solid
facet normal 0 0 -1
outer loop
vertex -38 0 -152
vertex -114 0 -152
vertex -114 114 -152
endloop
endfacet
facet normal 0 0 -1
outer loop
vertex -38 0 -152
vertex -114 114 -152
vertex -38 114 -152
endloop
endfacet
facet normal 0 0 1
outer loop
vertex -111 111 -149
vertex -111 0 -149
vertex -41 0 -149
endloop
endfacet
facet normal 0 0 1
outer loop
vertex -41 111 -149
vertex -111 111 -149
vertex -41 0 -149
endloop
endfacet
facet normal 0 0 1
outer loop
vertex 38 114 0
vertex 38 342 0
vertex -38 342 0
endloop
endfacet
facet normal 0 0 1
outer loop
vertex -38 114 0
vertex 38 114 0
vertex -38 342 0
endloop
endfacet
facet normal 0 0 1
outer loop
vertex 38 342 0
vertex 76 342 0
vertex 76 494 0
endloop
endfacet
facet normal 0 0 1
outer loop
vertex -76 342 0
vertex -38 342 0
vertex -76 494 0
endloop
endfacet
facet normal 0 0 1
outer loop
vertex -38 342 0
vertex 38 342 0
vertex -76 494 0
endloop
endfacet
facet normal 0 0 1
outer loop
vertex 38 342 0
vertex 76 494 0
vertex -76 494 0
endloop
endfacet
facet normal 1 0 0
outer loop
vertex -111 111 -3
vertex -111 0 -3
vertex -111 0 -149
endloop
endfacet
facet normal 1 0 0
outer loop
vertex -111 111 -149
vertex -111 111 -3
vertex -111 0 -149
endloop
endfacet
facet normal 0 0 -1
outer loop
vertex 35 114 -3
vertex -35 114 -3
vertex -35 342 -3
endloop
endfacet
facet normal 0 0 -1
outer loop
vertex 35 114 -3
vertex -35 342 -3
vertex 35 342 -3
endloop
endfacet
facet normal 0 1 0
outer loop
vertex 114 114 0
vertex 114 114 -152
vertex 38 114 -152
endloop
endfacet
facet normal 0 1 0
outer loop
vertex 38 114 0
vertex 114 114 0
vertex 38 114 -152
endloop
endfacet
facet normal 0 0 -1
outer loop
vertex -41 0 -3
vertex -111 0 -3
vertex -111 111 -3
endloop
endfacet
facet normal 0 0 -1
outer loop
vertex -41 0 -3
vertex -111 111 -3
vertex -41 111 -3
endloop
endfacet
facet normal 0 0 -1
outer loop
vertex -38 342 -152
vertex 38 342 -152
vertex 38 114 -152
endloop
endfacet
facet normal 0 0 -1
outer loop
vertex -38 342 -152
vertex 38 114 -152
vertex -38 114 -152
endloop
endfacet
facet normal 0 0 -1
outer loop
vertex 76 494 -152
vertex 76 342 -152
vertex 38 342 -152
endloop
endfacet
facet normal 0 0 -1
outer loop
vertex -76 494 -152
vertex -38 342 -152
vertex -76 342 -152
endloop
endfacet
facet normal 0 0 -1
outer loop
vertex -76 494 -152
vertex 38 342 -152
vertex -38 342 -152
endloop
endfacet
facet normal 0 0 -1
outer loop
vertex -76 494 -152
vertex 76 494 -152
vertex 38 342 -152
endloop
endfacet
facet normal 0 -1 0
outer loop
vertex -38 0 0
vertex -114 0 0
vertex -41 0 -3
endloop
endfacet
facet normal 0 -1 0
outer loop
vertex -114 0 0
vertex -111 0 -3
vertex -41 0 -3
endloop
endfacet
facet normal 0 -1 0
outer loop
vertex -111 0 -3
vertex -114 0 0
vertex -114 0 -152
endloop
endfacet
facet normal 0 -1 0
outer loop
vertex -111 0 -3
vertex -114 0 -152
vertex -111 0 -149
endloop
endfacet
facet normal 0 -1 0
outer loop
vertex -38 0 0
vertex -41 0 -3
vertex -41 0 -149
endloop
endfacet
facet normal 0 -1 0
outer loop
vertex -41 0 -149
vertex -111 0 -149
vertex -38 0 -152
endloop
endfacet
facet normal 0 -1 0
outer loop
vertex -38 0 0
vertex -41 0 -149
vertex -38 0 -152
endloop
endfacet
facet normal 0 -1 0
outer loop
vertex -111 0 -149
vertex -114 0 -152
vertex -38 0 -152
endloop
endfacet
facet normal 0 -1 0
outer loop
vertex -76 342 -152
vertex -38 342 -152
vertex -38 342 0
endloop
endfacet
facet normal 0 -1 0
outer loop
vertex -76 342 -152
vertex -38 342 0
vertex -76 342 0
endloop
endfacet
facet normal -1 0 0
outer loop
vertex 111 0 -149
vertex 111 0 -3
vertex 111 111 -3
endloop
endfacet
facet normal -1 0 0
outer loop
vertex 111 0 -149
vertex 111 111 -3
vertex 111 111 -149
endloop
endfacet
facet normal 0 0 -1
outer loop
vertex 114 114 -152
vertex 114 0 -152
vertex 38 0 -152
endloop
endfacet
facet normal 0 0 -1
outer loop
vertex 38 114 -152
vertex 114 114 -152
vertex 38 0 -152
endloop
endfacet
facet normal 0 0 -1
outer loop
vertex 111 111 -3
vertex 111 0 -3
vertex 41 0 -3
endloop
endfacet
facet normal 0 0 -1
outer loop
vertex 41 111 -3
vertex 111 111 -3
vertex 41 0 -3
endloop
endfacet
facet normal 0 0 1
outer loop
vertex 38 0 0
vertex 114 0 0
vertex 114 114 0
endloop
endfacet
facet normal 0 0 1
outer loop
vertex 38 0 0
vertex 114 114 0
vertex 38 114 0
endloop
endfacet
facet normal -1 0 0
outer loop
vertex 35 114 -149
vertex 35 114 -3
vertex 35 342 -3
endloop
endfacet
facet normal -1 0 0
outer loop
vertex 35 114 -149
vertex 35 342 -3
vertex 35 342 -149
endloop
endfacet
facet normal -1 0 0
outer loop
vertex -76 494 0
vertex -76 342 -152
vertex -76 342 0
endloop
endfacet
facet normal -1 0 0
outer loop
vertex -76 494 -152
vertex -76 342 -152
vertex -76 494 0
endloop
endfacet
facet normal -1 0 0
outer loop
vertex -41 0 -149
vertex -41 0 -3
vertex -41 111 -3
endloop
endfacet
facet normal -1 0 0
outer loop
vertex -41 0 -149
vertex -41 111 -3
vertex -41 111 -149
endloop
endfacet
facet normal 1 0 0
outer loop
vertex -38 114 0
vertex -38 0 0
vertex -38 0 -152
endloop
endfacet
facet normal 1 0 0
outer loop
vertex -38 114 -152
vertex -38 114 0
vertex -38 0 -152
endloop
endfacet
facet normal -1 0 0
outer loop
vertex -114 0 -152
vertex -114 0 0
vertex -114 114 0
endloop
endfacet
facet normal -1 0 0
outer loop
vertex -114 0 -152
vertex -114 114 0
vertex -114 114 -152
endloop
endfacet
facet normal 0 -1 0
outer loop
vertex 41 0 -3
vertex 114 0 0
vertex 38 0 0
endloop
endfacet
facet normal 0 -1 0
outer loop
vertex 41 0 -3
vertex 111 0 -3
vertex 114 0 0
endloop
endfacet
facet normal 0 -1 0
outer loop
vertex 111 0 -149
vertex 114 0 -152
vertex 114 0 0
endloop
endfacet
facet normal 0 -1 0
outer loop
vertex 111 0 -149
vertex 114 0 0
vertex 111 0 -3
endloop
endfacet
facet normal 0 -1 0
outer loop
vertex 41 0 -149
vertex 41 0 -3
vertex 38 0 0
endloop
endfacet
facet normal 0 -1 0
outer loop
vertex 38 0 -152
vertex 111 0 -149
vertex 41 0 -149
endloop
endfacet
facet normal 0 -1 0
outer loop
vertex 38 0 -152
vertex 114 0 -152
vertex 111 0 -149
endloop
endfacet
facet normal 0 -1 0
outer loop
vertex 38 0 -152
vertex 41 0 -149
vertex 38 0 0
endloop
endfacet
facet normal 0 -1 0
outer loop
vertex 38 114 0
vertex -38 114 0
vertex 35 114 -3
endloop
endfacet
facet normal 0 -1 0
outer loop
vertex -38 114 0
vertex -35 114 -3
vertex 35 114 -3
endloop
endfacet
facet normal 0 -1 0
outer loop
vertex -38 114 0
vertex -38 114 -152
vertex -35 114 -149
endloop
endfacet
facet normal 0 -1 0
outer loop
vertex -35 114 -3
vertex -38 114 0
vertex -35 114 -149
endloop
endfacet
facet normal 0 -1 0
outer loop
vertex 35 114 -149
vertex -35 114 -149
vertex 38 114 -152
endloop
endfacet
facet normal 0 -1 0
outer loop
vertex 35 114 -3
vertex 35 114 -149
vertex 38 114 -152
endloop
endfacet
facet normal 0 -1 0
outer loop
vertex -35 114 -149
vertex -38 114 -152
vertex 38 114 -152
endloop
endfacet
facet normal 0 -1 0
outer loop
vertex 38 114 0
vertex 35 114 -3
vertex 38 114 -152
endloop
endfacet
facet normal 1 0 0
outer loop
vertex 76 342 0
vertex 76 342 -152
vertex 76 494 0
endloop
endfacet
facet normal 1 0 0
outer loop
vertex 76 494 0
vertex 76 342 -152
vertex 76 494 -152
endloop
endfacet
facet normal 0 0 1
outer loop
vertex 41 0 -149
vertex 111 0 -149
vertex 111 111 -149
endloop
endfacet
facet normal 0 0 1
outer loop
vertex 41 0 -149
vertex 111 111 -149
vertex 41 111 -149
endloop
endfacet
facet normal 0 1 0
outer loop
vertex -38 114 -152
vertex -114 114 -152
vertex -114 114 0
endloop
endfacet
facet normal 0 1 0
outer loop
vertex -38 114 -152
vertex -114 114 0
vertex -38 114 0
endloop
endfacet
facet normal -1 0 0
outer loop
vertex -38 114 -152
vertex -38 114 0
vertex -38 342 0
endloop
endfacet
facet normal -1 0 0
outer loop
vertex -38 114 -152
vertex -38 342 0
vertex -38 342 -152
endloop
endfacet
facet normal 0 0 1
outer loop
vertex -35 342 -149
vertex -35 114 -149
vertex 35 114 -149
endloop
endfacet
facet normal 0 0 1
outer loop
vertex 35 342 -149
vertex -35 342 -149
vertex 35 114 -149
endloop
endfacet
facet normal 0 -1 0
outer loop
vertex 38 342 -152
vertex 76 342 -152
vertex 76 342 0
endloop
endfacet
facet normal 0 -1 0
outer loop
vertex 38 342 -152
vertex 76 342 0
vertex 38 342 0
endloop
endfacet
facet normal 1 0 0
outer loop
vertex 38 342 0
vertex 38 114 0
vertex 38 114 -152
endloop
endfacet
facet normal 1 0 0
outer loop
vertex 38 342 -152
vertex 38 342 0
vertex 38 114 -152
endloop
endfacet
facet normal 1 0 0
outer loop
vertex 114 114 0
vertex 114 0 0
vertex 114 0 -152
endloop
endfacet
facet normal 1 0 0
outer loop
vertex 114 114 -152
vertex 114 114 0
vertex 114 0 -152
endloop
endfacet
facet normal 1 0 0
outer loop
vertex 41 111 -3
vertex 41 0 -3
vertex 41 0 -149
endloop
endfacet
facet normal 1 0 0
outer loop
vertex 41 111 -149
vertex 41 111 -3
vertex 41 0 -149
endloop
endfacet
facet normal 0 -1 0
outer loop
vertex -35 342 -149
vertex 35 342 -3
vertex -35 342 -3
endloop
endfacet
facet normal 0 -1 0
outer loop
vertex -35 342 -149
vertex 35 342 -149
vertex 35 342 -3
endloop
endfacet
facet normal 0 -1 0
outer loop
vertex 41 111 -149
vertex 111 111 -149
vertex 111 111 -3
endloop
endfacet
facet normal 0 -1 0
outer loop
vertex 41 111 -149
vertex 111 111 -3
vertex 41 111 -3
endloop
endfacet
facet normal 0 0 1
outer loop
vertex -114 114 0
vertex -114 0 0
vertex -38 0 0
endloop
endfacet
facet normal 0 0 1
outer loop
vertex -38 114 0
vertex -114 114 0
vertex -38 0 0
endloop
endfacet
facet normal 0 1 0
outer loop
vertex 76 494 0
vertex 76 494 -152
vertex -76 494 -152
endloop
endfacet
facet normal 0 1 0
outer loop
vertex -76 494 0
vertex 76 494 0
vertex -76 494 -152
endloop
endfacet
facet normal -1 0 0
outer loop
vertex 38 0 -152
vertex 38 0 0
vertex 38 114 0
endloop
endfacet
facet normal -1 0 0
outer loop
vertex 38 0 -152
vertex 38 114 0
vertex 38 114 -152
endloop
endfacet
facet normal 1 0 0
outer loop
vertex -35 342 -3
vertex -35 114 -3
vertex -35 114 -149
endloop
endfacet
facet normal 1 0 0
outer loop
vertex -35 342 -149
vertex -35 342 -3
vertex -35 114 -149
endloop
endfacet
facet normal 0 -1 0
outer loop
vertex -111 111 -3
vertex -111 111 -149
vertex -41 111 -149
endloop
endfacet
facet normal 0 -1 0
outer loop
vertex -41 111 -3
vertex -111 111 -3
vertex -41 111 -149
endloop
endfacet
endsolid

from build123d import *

# Parameters (mm, degrees)
SKETCH1_W           = 76
SKETCH1_H           = 152
SKETCH1_W_2         = 70
SKETCH1_H_2         = 146
BOSS_EXTRUDE1_DEPTH = 114
SKETCH4_W           = 70
SKETCH4_H           = 3
BOSS_EXTRUDE2_DEPTH = 146
SKETCH5_W           = 76
SKETCH5_H           = 152
SKETCH5_W_2         = 70
SKETCH5_H_2         = 146
BOSS_EXTRUDE3_DEPTH = 228
SKETCH6_W           = 152
SKETCH6_H           = 152
BOSS_EXTRUDE4_DEPTH = 152


with BuildPart() as part:
    # Sketch1 → Boss-Extrude1 (new body)
    with BuildSketch(Plane(origin=(0, 0, 0), x_dir=(1, 0, 0), z_dir=(0, 1, 0))):
        with Locations((-76, 76)):
            Rectangle(SKETCH1_W, SKETCH1_H)
        with Locations((-76, 76)):
            Rectangle(SKETCH1_W_2, SKETCH1_H_2, mode=Mode.SUBTRACT)
    extrude(amount=BOSS_EXTRUDE1_DEPTH)

    # Sketch4 → Boss-Extrude2 (add)
    with BuildSketch(Plane.XY.offset(-149)):
        with Locations((-76, 112.5)):
            Rectangle(SKETCH4_W, SKETCH4_H)
    extrude(amount=BOSS_EXTRUDE2_DEPTH)


with BuildPart() as body_2:
    # Mirror2: mirrored copy
    add(part.part.mirror(Plane(origin=(0, 0, 0), x_dir=(0, 0, 1), z_dir=(1, 0, 0))))


with BuildPart() as body_3:
    # Sketch5 → Boss-Extrude3 (new body)
    with BuildSketch(Plane(origin=(0, 114, 0), x_dir=(1, 0, 0), z_dir=(0, 1, 0))):
        with Locations((0, 76)):
            Rectangle(SKETCH5_W, SKETCH5_H)
        with Locations((0, 76)):
            Rectangle(SKETCH5_W_2, SKETCH5_H_2, mode=Mode.SUBTRACT)
    extrude(amount=BOSS_EXTRUDE3_DEPTH)

    # Sketch6 → Boss-Extrude4 (add)
    with BuildSketch(Plane(origin=(0, 0, -152), x_dir=(-1, 0, 0), z_dir=(0, 0, -1))):
        with Locations((0, 418)):
            Rectangle(SKETCH6_W, SKETCH6_H)
    extrude(amount=-BOSS_EXTRUDE4_DEPTH)


solid = Compound([part.part, body_2.part, body_3.part])
